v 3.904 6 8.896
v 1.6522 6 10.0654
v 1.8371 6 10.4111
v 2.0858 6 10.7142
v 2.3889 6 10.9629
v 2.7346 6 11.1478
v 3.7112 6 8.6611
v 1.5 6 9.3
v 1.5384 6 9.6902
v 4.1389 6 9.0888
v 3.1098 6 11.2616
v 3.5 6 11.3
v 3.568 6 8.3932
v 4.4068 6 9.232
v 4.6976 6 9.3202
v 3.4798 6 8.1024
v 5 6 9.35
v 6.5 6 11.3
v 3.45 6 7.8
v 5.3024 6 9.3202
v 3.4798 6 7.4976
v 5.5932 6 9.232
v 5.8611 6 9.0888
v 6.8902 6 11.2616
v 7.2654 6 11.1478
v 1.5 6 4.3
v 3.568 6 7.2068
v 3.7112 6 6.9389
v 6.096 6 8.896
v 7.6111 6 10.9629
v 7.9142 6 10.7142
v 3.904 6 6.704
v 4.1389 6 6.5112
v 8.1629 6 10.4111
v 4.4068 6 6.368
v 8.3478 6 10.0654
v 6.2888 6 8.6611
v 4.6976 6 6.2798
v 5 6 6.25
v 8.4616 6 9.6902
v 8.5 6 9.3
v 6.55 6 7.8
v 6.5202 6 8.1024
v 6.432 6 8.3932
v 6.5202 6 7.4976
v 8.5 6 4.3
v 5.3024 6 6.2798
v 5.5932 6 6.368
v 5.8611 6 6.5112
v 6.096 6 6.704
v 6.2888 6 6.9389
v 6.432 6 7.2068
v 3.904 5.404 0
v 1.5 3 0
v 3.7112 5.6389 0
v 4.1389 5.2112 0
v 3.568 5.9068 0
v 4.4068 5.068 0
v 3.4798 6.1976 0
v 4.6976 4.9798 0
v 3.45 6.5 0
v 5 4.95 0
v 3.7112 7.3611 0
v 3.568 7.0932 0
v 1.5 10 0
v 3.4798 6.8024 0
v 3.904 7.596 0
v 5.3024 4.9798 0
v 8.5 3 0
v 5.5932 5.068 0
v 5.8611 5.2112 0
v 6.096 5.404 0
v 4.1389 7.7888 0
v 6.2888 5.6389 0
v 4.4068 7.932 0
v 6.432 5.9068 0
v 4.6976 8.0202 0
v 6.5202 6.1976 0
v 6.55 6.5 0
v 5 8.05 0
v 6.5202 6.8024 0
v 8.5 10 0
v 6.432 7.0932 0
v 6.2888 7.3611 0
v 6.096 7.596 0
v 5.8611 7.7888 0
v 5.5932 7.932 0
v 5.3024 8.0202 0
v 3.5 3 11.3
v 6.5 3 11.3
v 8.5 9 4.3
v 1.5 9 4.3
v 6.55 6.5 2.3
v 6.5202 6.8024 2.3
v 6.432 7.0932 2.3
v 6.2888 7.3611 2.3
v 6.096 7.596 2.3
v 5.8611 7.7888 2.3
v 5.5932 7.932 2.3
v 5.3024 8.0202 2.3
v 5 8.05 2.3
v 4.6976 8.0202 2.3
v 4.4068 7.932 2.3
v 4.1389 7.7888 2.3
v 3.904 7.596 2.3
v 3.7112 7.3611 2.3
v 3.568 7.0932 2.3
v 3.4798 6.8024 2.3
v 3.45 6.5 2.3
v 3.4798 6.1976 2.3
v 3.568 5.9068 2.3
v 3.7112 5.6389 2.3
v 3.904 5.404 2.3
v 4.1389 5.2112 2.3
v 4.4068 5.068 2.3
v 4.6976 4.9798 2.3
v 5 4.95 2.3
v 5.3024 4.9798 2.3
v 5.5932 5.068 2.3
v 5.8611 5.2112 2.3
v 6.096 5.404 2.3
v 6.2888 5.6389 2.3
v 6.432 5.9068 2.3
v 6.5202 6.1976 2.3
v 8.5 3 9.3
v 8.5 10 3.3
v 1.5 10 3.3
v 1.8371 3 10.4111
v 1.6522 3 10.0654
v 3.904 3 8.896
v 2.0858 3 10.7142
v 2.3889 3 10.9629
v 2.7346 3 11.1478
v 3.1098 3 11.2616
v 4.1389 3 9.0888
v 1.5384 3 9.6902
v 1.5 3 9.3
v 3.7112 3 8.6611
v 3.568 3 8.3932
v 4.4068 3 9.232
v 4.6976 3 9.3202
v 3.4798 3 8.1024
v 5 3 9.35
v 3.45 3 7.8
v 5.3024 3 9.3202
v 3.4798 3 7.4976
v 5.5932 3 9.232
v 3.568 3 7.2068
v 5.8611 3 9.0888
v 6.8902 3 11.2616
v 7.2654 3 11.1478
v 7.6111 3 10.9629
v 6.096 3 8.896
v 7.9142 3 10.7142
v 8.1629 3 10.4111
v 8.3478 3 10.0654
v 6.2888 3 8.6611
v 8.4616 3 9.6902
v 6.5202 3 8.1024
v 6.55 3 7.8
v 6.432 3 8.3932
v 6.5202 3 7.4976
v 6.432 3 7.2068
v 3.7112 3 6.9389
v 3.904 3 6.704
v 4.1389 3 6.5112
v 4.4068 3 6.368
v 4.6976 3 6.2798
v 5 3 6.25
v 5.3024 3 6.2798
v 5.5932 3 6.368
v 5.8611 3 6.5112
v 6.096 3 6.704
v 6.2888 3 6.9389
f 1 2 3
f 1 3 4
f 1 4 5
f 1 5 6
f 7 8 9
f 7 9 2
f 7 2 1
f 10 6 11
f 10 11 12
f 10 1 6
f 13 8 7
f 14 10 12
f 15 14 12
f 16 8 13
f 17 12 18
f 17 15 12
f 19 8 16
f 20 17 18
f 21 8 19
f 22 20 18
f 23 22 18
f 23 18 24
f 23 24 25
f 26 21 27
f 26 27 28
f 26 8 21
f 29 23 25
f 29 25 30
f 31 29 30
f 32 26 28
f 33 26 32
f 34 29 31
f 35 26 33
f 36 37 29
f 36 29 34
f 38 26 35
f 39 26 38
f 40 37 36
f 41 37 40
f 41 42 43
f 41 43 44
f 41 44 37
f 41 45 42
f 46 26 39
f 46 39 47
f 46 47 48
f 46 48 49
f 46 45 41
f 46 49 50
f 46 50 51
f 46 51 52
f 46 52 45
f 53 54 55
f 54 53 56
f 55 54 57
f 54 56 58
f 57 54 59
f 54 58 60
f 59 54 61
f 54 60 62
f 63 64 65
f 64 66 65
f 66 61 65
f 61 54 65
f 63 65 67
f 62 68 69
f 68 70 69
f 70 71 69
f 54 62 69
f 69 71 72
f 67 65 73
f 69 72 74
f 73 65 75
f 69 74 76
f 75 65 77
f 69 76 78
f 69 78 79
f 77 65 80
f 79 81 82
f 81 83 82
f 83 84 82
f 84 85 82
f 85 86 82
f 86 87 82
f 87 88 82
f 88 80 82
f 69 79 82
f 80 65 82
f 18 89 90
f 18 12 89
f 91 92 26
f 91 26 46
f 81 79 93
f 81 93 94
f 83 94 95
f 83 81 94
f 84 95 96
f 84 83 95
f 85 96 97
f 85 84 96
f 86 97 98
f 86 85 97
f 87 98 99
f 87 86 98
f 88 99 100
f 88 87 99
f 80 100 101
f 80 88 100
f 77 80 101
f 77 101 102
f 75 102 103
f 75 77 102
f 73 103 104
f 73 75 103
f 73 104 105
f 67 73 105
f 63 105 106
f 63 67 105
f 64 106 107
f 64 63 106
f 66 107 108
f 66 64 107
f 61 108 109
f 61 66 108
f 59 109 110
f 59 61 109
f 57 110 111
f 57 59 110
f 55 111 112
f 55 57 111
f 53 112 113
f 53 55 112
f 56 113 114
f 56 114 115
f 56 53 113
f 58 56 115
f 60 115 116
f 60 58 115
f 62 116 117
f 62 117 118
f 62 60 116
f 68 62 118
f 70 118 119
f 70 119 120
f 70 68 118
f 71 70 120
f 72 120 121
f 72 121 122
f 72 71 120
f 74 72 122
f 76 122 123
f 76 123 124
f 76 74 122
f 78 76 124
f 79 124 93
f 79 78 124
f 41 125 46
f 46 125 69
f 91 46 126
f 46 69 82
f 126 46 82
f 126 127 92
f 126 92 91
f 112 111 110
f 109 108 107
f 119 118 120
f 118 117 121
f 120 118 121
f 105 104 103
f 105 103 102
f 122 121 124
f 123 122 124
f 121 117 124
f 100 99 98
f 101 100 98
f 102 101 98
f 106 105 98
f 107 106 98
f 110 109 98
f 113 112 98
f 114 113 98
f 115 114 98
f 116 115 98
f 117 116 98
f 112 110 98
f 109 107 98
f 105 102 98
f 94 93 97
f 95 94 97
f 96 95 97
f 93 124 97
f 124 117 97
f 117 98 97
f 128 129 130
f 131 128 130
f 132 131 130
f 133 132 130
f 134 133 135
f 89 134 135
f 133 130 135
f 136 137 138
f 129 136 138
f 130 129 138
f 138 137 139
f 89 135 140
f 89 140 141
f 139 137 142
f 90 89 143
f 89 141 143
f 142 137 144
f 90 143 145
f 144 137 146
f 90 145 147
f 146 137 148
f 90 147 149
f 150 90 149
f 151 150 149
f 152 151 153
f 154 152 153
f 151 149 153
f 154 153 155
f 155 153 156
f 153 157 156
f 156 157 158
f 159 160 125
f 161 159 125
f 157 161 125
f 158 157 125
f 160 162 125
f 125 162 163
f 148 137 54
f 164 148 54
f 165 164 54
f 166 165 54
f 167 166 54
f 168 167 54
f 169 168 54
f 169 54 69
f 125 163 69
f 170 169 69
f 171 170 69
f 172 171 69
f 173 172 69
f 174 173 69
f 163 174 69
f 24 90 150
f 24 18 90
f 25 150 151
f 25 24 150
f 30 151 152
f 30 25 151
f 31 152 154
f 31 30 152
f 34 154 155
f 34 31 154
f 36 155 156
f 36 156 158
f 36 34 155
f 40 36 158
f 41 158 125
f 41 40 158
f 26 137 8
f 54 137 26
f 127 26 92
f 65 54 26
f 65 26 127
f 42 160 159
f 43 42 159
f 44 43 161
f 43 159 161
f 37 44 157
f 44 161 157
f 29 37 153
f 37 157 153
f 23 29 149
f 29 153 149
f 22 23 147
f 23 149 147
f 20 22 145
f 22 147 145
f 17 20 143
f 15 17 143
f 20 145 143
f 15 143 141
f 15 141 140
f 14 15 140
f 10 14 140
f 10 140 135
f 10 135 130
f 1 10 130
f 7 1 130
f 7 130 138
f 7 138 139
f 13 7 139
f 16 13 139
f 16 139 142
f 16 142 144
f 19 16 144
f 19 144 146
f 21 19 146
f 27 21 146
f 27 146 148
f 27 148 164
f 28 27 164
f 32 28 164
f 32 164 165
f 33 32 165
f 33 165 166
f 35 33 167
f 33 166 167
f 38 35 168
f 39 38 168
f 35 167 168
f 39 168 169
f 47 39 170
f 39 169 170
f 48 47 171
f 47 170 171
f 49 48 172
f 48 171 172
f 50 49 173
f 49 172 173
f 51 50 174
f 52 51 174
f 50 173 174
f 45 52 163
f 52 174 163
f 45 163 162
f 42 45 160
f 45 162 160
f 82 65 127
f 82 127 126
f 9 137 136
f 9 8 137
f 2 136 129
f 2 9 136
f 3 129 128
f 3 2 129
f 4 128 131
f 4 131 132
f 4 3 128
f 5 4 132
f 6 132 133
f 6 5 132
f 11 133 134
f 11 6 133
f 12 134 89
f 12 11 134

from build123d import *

# Parameters (mm, degrees)
SKETCH1_W           = 7
SKETCH1_H           = 7
SKETCH1_R           = 1.55
BOSS_EXTRUDE1_DEPTH = 2.3
SKETCH3_W           = 7
SKETCH3_H           = 7
BOSS_EXTRUDE2_DEPTH = 2
SKETCH4_W           = 7
SKETCH4_H           = 3
BOSS_EXTRUDE3_DEPTH = 7
CUT_EXTRUDE1_REACH  = 9
SKETCH5_R           = 1.55
FILLET1_R           = 2
CHAMFER1_SIZE       = 1


with BuildPart() as part:
    # Sketch1 → Boss-Extrude1 (new body)
    with BuildSketch(Plane.XY):
        with Locations((5, 6.5)):
            Rectangle(SKETCH1_W, SKETCH1_H)
        with Locations((5, 6.5)):
            Circle(SKETCH1_R, mode=Mode.SUBTRACT)
    extrude(amount=BOSS_EXTRUDE1_DEPTH)

    # Sketch3 → Boss-Extrude2 (add)
    with BuildSketch(Plane.XY.offset(2.3)):
        with Locations((5, 6.5)):
            Rectangle(SKETCH3_W, SKETCH3_H)
    extrude(amount=BOSS_EXTRUDE2_DEPTH)

    # Sketch4 → Boss-Extrude3 (add)
    with BuildSketch(Plane.XY.offset(4.3)):
        with Locations((5, 4.5)):
            Rectangle(SKETCH4_W, SKETCH4_H)
    extrude(amount=BOSS_EXTRUDE3_DEPTH)

    # Sketch5 → Cut-Extrude1 (cut, up to next)
    with BuildSketch(Plane.XZ.offset(-3), mode=Mode.PRIVATE) as cut_extrude1_sk1:
        with Locations((5, 7.8)):
            Circle(SKETCH5_R)
    cut_extrude1_tool1 = extrude(cut_extrude1_sk1.sketch, amount=-CUT_EXTRUDE1_REACH, mode=Mode.PRIVATE) & part.part
    add(cut_extrude1_tool1.solids().sort_by_distance((5, 3, 7.8))[0], mode=Mode.SUBTRACT)

    # Fillet1
    fillet1_edges = [part.edges().sort_by_distance(p)[0] for p in [
        (8.5, 4.5, 11.3),
        (1.5, 4.5, 11.3),
    ]]
    fillet(fillet1_edges, radius=FILLET1_R)

    # Chamfer1
    chamfer1_edges = [part.edges().sort_by_distance(p)[0] for p in [
        (5, 10, 4.3),
    ]]
    chamfer(chamfer1_edges, length=CHAMFER1_SIZE)


solid = part.part
